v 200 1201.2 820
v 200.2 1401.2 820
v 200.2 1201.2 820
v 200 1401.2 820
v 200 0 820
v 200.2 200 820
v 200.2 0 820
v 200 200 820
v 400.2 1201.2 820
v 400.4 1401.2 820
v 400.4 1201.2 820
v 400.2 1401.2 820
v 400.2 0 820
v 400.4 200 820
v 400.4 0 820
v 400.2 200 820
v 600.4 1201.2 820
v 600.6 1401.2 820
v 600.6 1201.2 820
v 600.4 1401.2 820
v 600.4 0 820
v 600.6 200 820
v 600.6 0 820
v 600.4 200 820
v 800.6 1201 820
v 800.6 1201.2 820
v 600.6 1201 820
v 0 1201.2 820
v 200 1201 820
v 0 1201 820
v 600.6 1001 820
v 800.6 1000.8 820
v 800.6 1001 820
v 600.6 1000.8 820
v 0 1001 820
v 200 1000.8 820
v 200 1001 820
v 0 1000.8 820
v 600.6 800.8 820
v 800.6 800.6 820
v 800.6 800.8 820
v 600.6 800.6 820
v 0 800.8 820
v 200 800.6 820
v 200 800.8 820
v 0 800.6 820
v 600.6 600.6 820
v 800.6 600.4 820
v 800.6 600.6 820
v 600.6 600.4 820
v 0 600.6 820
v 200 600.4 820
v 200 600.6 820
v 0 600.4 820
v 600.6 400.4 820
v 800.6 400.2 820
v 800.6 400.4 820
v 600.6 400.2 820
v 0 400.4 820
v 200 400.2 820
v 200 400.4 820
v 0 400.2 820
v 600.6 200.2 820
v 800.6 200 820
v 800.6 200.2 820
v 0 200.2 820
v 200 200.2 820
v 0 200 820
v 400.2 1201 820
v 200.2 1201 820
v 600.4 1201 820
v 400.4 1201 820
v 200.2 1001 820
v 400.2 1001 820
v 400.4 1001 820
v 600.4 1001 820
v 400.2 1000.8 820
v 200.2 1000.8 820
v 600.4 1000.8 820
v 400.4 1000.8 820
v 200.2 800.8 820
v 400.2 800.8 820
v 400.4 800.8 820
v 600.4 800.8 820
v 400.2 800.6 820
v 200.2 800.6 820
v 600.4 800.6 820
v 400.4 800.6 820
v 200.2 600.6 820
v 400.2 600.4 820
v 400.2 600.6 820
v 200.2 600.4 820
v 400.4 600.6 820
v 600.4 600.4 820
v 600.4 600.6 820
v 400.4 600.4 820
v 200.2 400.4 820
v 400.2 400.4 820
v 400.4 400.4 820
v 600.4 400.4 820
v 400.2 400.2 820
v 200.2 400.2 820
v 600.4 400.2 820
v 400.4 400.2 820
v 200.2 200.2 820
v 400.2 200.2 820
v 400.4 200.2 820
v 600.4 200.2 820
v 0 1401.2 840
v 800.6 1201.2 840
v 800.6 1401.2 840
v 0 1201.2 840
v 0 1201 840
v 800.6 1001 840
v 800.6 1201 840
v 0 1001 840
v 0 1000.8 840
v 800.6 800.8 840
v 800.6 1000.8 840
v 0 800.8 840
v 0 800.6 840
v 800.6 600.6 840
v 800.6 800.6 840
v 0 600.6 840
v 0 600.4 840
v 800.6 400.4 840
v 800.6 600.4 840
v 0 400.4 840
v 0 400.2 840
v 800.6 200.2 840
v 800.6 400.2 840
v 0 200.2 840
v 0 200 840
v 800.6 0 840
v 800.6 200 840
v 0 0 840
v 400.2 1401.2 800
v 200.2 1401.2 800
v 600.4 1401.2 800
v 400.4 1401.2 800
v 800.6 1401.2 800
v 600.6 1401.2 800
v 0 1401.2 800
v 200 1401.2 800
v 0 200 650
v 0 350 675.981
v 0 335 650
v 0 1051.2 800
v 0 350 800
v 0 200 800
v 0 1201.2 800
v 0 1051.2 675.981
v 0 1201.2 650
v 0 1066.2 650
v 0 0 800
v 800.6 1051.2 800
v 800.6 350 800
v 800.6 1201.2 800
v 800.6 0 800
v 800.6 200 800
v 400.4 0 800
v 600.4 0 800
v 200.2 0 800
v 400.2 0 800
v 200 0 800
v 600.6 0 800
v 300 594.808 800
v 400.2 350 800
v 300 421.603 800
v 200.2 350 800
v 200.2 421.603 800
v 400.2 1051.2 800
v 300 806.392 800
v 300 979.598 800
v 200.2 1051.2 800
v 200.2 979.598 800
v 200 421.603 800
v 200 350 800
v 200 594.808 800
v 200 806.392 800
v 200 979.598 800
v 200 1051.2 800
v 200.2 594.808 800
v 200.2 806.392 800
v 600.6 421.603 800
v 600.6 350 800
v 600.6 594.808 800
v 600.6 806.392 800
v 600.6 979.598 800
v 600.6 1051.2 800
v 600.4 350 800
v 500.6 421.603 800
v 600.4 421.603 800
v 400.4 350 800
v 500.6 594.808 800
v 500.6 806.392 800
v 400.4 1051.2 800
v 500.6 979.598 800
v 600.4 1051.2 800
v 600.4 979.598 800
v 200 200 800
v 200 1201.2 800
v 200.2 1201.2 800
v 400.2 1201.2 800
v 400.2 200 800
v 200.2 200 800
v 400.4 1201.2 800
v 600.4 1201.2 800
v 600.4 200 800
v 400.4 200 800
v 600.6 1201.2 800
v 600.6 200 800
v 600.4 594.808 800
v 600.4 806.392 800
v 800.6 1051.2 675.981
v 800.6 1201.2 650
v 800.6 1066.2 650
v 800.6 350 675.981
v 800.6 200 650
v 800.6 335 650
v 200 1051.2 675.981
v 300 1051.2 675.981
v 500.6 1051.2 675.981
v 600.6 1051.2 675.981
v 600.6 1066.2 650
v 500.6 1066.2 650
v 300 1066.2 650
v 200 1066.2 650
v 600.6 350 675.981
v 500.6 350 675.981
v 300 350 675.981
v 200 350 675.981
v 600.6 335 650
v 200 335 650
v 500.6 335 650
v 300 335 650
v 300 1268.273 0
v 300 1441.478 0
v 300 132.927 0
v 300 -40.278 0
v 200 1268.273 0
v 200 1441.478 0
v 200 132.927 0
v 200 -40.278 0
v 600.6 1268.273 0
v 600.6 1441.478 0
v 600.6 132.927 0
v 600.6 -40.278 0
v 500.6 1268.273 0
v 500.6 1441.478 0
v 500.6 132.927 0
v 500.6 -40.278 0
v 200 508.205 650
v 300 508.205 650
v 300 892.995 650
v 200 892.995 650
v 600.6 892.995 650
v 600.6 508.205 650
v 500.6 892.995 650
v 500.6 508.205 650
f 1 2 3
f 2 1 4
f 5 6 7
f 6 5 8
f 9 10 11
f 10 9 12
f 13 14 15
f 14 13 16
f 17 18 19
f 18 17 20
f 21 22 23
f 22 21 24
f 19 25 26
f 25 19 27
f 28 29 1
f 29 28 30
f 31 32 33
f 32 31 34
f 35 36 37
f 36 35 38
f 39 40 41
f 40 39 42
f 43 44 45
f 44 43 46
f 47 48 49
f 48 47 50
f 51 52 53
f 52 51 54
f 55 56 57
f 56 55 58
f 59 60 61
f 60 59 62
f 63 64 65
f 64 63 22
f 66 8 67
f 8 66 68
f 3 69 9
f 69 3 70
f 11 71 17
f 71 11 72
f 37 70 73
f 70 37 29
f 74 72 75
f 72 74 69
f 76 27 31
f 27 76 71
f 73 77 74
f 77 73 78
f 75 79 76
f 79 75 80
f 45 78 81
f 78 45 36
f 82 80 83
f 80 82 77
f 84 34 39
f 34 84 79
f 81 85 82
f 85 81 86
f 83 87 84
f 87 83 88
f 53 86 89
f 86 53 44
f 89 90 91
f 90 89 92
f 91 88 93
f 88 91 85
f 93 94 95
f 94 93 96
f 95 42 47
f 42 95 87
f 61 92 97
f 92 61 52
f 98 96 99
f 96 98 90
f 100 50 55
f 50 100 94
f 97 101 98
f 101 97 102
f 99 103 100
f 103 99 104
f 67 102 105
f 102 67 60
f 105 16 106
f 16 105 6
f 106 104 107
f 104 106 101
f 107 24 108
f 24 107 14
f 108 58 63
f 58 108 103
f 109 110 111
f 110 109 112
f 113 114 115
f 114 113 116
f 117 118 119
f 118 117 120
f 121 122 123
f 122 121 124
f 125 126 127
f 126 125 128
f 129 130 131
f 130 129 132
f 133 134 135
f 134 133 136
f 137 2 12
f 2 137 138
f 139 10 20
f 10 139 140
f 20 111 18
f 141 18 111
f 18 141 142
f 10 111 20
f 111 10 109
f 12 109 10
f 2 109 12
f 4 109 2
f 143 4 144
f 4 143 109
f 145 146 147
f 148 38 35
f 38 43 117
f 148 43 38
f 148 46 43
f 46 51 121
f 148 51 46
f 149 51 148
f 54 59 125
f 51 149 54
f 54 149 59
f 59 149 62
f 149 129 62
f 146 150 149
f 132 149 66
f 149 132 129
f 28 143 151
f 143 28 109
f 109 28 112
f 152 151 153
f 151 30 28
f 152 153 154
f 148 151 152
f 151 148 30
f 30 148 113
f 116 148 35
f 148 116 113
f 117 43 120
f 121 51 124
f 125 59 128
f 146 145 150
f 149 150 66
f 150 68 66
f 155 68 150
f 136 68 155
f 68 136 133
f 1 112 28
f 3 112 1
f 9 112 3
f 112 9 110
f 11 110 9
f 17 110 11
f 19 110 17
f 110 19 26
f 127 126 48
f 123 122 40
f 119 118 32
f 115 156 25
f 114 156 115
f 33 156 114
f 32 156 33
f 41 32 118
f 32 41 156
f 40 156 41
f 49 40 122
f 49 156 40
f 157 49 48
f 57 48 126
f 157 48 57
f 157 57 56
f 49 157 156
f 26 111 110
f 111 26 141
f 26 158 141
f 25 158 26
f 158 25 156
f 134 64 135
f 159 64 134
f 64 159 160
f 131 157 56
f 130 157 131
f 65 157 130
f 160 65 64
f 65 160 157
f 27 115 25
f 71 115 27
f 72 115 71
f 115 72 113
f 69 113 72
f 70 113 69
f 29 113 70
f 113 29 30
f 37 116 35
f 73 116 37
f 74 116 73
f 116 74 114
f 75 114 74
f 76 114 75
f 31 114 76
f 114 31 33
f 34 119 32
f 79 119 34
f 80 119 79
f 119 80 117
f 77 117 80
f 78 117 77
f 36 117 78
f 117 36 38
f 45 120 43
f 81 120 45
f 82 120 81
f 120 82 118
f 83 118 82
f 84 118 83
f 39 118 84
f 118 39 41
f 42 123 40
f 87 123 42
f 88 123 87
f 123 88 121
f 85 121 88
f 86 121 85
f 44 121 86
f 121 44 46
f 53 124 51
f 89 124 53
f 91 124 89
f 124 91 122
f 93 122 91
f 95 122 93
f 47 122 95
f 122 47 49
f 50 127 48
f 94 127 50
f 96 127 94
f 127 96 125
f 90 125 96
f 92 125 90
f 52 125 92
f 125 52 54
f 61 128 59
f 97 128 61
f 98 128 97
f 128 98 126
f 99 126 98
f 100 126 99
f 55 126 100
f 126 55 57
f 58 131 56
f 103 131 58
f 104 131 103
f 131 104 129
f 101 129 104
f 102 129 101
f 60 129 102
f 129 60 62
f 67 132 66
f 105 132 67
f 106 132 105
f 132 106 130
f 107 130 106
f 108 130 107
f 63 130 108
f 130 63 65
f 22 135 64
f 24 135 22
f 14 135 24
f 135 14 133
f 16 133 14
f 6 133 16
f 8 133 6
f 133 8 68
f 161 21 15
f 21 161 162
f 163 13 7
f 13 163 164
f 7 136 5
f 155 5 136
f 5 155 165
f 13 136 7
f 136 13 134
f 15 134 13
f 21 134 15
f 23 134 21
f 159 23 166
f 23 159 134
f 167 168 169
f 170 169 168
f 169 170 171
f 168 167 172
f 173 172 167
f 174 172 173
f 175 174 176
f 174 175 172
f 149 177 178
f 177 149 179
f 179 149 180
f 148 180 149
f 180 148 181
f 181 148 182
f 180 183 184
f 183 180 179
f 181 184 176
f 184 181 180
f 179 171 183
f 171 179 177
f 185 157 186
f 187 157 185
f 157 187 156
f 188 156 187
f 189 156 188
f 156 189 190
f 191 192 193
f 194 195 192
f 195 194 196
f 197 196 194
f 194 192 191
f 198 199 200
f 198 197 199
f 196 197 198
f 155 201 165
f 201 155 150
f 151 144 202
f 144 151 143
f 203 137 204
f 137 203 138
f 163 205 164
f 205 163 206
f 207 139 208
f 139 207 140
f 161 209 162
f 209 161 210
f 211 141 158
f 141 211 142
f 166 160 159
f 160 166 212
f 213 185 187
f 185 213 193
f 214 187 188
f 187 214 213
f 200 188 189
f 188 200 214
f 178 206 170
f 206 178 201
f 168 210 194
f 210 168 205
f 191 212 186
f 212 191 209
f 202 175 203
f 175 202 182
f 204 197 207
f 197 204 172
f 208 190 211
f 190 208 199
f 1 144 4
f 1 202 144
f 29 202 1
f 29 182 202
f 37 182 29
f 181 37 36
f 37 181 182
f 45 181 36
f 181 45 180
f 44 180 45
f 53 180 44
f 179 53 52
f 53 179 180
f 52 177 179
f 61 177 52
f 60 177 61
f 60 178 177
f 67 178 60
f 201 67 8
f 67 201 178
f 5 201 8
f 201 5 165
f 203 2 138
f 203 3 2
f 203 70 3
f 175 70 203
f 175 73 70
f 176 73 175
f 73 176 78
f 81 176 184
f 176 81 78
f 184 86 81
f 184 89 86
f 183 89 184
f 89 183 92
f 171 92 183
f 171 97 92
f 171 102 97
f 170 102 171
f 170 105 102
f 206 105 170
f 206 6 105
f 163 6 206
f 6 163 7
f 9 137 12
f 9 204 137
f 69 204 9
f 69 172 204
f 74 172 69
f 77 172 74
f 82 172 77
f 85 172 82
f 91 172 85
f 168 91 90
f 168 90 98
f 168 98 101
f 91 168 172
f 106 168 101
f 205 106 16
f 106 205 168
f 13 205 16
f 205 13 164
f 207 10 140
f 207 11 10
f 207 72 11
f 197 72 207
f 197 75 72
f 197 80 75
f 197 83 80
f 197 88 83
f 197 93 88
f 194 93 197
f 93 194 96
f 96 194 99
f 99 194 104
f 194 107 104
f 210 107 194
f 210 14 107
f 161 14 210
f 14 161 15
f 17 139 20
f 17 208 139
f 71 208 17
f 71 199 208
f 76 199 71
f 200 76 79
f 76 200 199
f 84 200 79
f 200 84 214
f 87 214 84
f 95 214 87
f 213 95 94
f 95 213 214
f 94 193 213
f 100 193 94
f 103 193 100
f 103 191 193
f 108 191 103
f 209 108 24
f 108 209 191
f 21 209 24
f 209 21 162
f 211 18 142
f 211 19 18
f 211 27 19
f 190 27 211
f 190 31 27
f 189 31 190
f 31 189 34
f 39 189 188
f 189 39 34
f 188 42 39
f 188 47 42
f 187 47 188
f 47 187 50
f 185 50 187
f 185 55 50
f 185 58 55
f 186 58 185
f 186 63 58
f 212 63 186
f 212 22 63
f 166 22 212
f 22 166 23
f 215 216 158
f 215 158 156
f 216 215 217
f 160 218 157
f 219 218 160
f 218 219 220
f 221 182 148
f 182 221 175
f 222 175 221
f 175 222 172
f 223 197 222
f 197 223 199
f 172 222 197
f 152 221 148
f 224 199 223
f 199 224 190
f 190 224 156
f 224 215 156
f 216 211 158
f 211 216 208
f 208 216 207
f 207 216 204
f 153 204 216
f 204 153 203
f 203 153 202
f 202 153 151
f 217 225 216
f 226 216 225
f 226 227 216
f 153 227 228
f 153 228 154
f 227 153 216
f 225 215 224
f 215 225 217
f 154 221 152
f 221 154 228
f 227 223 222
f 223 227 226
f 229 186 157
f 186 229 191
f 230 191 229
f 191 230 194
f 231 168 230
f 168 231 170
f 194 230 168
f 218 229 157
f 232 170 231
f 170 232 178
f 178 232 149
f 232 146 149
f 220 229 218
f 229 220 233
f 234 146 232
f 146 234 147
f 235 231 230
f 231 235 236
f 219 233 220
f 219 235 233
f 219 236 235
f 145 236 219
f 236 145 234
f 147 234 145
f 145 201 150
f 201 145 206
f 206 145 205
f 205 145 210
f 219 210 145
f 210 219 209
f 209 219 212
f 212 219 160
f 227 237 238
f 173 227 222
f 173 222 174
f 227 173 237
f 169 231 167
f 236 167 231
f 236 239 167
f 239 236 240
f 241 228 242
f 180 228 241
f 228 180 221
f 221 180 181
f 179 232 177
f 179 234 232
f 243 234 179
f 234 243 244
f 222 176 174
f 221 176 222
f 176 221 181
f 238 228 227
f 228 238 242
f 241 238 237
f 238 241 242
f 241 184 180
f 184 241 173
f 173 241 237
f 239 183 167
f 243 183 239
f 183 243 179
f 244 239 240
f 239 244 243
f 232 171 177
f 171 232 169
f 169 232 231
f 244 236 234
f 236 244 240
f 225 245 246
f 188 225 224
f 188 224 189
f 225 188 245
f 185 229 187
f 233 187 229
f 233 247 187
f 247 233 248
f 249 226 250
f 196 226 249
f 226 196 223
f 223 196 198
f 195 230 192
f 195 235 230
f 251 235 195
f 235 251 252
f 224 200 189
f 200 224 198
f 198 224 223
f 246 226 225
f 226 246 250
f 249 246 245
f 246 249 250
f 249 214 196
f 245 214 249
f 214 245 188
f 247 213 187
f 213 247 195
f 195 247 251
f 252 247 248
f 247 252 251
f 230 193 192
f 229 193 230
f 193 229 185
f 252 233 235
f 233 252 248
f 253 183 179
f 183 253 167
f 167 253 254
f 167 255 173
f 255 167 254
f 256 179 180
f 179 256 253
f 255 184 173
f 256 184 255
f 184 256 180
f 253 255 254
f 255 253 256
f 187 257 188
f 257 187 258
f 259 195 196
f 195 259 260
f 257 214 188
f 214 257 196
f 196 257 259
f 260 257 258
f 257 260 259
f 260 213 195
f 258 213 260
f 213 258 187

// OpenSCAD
// Generated by Parametrix
ca_cabane_plancher_facePlancherTop_000 = [ [ 0.0000, 0.0000 ],[ 800.6000, 0.0000 ],[ 800.6000, 200.0000 ],[ 0.0000, 200.0000 ],[ 0.0000, 0.0000 ] ];
cb_cabane_plancher_facePlancherTop_000 = [  0, 1, 2, 3, 4 ];
ca_cabane_plancher_facePlancherTop_001 = [ [ 0.0000, 200.2000 ],[ 800.6000, 200.2000 ],[ 800.6000, 400.2000 ],[ 0.0000, 400.2000 ],[ 0.0000, 200.2000 ] ];
cb_cabane_plancher_facePlancherTop_001 = [  5, 6, 7, 8, 9 ];
ca_cabane_plancher_facePlancherTop_002 = [ [ 0.0000, 400.4000 ],[ 800.6000, 400.4000 ],[ 800.6000, 600.4000 ],[ 0.0000, 600.4000 ],[ 0.0000, 400.4000 ] ];
cb_cabane_plancher_facePlancherTop_002 = [  10, 11, 12, 13, 14 ];
ca_cabane_plancher_facePlancherTop_003 = [ [ 0.0000, 600.6000 ],[ 800.6000, 600.6000 ],[ 800.6000, 800.6000 ],[ 0.0000, 800.6000 ],[ 0.0000, 600.6000 ] ];
cb_cabane_plancher_facePlancherTop_003 = [  15, 16, 17, 18, 19 ];
ca_cabane_plancher_facePlancherTop_004 = [ [ 0.0000, 800.8000 ],[ 800.6000, 800.8000 ],[ 800.6000, 1000.8000 ],[ 0.0000, 1000.8000 ],[ 0.0000, 800.8000 ] ];
cb_cabane_plancher_facePlancherTop_004 = [  20, 21, 22, 23, 24 ];
ca_cabane_plancher_facePlancherTop_005 = [ [ 0.0000, 1001.0000 ],[ 800.6000, 1001.0000 ],[ 800.6000, 1201.0000 ],[ 0.0000, 1201.0000 ],[ 0.0000, 1001.0000 ] ];
cb_cabane_plancher_facePlancherTop_005 = [  25, 26, 27, 28, 29 ];
ca_cabane_plancher_facePlancherTop_006 = [ [ 0.0000, 1201.2000 ],[ 800.6000, 1201.2000 ],[ 800.6000, 1401.2000 ],[ 0.0000, 1401.2000 ],[ 0.0000, 1201.2000 ] ];
cb_cabane_plancher_facePlancherTop_006 = [  30, 31, 32, 33, 34 ];
a_cabane_plancher_facePlancherTop = concat(ca_cabane_plancher_facePlancherTop_000, ca_cabane_plancher_facePlancherTop_001, ca_cabane_plancher_facePlancherTop_002, ca_cabane_plancher_facePlancherTop_003, ca_cabane_plancher_facePlancherTop_004, ca_cabane_plancher_facePlancherTop_005, ca_cabane_plancher_facePlancherTop_006);
b_cabane_plancher_facePlancherTop = [cb_cabane_plancher_facePlancherTop_000, cb_cabane_plancher_facePlancherTop_001, cb_cabane_plancher_facePlancherTop_002, cb_cabane_plancher_facePlancherTop_003, cb_cabane_plancher_facePlancherTop_004, cb_cabane_plancher_facePlancherTop_005, cb_cabane_plancher_facePlancherTop_006];
ca_cabane_plancher_facePlancherBottom_000 = [ [ 0.0000, 0.0000 ],[ 200.0000, 0.0000 ],[ 200.0000, 1401.2000 ],[ 0.0000, 1401.2000 ],[ 0.0000, 0.0000 ] ];
cb_cabane_plancher_facePlancherBottom_000 = [  0, 1, 2, 3, 4 ];
ca_cabane_plancher_facePlancherBottom_001 = [ [ 200.2000, 0.0000 ],[ 400.2000, 0.0000 ],[ 400.2000, 1401.2000 ],[ 200.2000, 1401.2000 ],[ 200.2000, 0.0000 ] ];
cb_cabane_plancher_facePlancherBottom_001 = [  5, 6, 7, 8, 9 ];
ca_cabane_plancher_facePlancherBottom_002 = [ [ 400.4000, 0.0000 ],[ 600.4000, 0.0000 ],[ 600.4000, 1401.2000 ],[ 400.4000, 1401.2000 ],[ 400.4000, 0.0000 ] ];
cb_cabane_plancher_facePlancherBottom_002 = [  10, 11, 12, 13, 14 ];
ca_cabane_plancher_facePlancherBottom_003 = [ [ 600.6000, 0.0000 ],[ 800.6000, 0.0000 ],[ 800.6000, 1401.2000 ],[ 600.6000, 1401.2000 ],[ 600.6000, 0.0000 ] ];
cb_cabane_plancher_facePlancherBottom_003 = [  15, 16, 17, 18, 19 ];
a_cabane_plancher_facePlancherBottom = concat(ca_cabane_plancher_facePlancherBottom_000, ca_cabane_plancher_facePlancherBottom_001, ca_cabane_plancher_facePlancherBottom_002, ca_cabane_plancher_facePlancherBottom_003);
b_cabane_plancher_facePlancherBottom = [cb_cabane_plancher_facePlancherBottom_000, cb_cabane_plancher_facePlancherBottom_001, cb_cabane_plancher_facePlancherBottom_002, cb_cabane_plancher_facePlancherBottom_003];
ca_cabane_plancher_faceBeam_000 = [ [ 200.0000, 800.0000 ],[ 350.0000, 800.0000 ],[ 350.0000, 675.9808 ],[ 335.0000, 650.0000 ],[ 200.0000, 650.0000 ],[ 200.0000, 800.0000 ] ];
cb_cabane_plancher_faceBeam_000 = [  0, 1, 2, 3, 4, 5 ];
ca_cabane_plancher_faceBeam_001 = [ [ 1201.2000, 800.0000 ],[ 1051.2000, 800.0000 ],[ 1051.2000, 675.9808 ],[ 1066.2000, 650.0000 ],[ 1201.2000, 650.0000 ],[ 1201.2000, 800.0000 ] ];
cb_cabane_plancher_faceBeam_001 = [  6, 7, 8, 9, 10, 11 ];
a_cabane_plancher_faceBeam = concat(ca_cabane_plancher_faceBeam_000, ca_cabane_plancher_faceBeam_001);
b_cabane_plancher_faceBeam = [cb_cabane_plancher_faceBeam_000, cb_cabane_plancher_faceBeam_001];
ca_cabane_plancher_faceLeg_000 = [ [ 594.8076, 800.0000 ],[ 421.6025, 800.0000 ],[ -40.2777, 0.0000 ],[ 132.9274, 0.0000 ],[ 594.8076, 800.0000 ] ];
cb_cabane_plancher_faceLeg_000 = [  0, 1, 2, 3, 4 ];
ca_cabane_plancher_faceLeg_001 = [ [ 806.3924, 800.0000 ],[ 979.5975, 800.0000 ],[ 1441.4777, 0.0000 ],[ 1268.2726, 0.0000 ],[ 806.3924, 800.0000 ] ];
cb_cabane_plancher_faceLeg_001 = [  5, 6, 7, 8, 9 ];
a_cabane_plancher_faceLeg = concat(ca_cabane_plancher_faceLeg_000, ca_cabane_plancher_faceLeg_001);
b_cabane_plancher_faceLeg = [cb_cabane_plancher_faceLeg_000, cb_cabane_plancher_faceLeg_001];
ca_cabane_plancher_faceButtress_000 = [ [ 594.8076, 800.0000 ],[ 806.3924, 800.0000 ],[ 892.9949, 650.0000 ],[ 508.2051, 650.0000 ],[ 594.8076, 800.0000 ] ];
cb_cabane_plancher_faceButtress_000 = [  0, 1, 2, 3, 4 ];
a_cabane_plancher_faceButtress = concat(ca_cabane_plancher_faceButtress_000);
b_cabane_plancher_faceButtress = [cb_cabane_plancher_faceButtress_000];
ca_cabane_plancher_faceSide_000 = [ [ 200.0000, 0.0000 ],[ 300.0000, 0.0000 ],[ 300.0000, 800.0000 ],[ 200.0000, 800.0000 ],[ 200.0000, 0.0000 ] ];
cb_cabane_plancher_faceSide_000 = [  0, 1, 2, 3, 4 ];
ca_cabane_plancher_faceSide_001 = [ [ 500.6000, 0.0000 ],[ 600.6000, 0.0000 ],[ 600.6000, 800.0000 ],[ 500.6000, 800.0000 ],[ 500.6000, 0.0000 ] ];
cb_cabane_plancher_faceSide_001 = [  5, 6, 7, 8, 9 ];
a_cabane_plancher_faceSide = concat(ca_cabane_plancher_faceSide_000, ca_cabane_plancher_faceSide_001);
b_cabane_plancher_faceSide = [cb_cabane_plancher_faceSide_000, cb_cabane_plancher_faceSide_001];

module subpax_cabane_plancher_plancherTop () {
	translate( [ 0, 0, 820 ])
		rotate( [ 0, 0, 0 ])
			   linear_extrude(height = 20) polygon(a_cabane_plancher_facePlancherTop, b_cabane_plancher_facePlancherTop);
}

module subpax_cabane_plancher_plancherBottom () {
	translate( [ 0, 0, 800 ])
		rotate( [ 0, 0, 0 ])
			   linear_extrude(height = 20) polygon(a_cabane_plancher_facePlancherBottom, b_cabane_plancher_facePlancherBottom);
}

module subpax_cabane_plancher_beam () {
	translate( [ 800.6, 1401.2, 0 ])
		rotate( [ 90, 0, -90 ])
			   linear_extrude(height = 800.6) polygon(a_cabane_plancher_faceBeam, b_cabane_plancher_faceBeam);
}

module subpax_cabane_plancher_leg1 () {
	translate( [ 300, 1401.2, 0 ])
		rotate( [ 90, 0, -90 ])
			   linear_extrude(height = 100) polygon(a_cabane_plancher_faceLeg, b_cabane_plancher_faceLeg);
}

module subpax_cabane_plancher_leg2 () {
	translate( [ 600.6, 1401.2, 0 ])
		rotate( [ 90, 0, -90 ])
			   linear_extrude(height = 100) polygon(a_cabane_plancher_faceLeg, b_cabane_plancher_faceLeg);
}

module subpax_cabane_plancher_buttress1 () {
	translate( [ 300, 1401.2, 0 ])
		rotate( [ 90, 0, -90 ])
			   linear_extrude(height = 100) polygon(a_cabane_plancher_faceButtress, b_cabane_plancher_faceButtress);
}

module subpax_cabane_plancher_buttress2 () {
	translate( [ 600.6, 1401.2, 0 ])
		rotate( [ 90, 0, -90 ])
			   linear_extrude(height = 100) polygon(a_cabane_plancher_faceButtress, b_cabane_plancher_faceButtress);
}

module pax_cabane_plancher () {
	union () {
		subpax_cabane_plancher_plancherTop();
subpax_cabane_plancher_plancherBottom();
subpax_cabane_plancher_beam();
subpax_cabane_plancher_leg1();
subpax_cabane_plancher_leg2();
subpax_cabane_plancher_buttress1();
subpax_cabane_plancher_buttress2();
	}
}

pax_cabane_plancher();
